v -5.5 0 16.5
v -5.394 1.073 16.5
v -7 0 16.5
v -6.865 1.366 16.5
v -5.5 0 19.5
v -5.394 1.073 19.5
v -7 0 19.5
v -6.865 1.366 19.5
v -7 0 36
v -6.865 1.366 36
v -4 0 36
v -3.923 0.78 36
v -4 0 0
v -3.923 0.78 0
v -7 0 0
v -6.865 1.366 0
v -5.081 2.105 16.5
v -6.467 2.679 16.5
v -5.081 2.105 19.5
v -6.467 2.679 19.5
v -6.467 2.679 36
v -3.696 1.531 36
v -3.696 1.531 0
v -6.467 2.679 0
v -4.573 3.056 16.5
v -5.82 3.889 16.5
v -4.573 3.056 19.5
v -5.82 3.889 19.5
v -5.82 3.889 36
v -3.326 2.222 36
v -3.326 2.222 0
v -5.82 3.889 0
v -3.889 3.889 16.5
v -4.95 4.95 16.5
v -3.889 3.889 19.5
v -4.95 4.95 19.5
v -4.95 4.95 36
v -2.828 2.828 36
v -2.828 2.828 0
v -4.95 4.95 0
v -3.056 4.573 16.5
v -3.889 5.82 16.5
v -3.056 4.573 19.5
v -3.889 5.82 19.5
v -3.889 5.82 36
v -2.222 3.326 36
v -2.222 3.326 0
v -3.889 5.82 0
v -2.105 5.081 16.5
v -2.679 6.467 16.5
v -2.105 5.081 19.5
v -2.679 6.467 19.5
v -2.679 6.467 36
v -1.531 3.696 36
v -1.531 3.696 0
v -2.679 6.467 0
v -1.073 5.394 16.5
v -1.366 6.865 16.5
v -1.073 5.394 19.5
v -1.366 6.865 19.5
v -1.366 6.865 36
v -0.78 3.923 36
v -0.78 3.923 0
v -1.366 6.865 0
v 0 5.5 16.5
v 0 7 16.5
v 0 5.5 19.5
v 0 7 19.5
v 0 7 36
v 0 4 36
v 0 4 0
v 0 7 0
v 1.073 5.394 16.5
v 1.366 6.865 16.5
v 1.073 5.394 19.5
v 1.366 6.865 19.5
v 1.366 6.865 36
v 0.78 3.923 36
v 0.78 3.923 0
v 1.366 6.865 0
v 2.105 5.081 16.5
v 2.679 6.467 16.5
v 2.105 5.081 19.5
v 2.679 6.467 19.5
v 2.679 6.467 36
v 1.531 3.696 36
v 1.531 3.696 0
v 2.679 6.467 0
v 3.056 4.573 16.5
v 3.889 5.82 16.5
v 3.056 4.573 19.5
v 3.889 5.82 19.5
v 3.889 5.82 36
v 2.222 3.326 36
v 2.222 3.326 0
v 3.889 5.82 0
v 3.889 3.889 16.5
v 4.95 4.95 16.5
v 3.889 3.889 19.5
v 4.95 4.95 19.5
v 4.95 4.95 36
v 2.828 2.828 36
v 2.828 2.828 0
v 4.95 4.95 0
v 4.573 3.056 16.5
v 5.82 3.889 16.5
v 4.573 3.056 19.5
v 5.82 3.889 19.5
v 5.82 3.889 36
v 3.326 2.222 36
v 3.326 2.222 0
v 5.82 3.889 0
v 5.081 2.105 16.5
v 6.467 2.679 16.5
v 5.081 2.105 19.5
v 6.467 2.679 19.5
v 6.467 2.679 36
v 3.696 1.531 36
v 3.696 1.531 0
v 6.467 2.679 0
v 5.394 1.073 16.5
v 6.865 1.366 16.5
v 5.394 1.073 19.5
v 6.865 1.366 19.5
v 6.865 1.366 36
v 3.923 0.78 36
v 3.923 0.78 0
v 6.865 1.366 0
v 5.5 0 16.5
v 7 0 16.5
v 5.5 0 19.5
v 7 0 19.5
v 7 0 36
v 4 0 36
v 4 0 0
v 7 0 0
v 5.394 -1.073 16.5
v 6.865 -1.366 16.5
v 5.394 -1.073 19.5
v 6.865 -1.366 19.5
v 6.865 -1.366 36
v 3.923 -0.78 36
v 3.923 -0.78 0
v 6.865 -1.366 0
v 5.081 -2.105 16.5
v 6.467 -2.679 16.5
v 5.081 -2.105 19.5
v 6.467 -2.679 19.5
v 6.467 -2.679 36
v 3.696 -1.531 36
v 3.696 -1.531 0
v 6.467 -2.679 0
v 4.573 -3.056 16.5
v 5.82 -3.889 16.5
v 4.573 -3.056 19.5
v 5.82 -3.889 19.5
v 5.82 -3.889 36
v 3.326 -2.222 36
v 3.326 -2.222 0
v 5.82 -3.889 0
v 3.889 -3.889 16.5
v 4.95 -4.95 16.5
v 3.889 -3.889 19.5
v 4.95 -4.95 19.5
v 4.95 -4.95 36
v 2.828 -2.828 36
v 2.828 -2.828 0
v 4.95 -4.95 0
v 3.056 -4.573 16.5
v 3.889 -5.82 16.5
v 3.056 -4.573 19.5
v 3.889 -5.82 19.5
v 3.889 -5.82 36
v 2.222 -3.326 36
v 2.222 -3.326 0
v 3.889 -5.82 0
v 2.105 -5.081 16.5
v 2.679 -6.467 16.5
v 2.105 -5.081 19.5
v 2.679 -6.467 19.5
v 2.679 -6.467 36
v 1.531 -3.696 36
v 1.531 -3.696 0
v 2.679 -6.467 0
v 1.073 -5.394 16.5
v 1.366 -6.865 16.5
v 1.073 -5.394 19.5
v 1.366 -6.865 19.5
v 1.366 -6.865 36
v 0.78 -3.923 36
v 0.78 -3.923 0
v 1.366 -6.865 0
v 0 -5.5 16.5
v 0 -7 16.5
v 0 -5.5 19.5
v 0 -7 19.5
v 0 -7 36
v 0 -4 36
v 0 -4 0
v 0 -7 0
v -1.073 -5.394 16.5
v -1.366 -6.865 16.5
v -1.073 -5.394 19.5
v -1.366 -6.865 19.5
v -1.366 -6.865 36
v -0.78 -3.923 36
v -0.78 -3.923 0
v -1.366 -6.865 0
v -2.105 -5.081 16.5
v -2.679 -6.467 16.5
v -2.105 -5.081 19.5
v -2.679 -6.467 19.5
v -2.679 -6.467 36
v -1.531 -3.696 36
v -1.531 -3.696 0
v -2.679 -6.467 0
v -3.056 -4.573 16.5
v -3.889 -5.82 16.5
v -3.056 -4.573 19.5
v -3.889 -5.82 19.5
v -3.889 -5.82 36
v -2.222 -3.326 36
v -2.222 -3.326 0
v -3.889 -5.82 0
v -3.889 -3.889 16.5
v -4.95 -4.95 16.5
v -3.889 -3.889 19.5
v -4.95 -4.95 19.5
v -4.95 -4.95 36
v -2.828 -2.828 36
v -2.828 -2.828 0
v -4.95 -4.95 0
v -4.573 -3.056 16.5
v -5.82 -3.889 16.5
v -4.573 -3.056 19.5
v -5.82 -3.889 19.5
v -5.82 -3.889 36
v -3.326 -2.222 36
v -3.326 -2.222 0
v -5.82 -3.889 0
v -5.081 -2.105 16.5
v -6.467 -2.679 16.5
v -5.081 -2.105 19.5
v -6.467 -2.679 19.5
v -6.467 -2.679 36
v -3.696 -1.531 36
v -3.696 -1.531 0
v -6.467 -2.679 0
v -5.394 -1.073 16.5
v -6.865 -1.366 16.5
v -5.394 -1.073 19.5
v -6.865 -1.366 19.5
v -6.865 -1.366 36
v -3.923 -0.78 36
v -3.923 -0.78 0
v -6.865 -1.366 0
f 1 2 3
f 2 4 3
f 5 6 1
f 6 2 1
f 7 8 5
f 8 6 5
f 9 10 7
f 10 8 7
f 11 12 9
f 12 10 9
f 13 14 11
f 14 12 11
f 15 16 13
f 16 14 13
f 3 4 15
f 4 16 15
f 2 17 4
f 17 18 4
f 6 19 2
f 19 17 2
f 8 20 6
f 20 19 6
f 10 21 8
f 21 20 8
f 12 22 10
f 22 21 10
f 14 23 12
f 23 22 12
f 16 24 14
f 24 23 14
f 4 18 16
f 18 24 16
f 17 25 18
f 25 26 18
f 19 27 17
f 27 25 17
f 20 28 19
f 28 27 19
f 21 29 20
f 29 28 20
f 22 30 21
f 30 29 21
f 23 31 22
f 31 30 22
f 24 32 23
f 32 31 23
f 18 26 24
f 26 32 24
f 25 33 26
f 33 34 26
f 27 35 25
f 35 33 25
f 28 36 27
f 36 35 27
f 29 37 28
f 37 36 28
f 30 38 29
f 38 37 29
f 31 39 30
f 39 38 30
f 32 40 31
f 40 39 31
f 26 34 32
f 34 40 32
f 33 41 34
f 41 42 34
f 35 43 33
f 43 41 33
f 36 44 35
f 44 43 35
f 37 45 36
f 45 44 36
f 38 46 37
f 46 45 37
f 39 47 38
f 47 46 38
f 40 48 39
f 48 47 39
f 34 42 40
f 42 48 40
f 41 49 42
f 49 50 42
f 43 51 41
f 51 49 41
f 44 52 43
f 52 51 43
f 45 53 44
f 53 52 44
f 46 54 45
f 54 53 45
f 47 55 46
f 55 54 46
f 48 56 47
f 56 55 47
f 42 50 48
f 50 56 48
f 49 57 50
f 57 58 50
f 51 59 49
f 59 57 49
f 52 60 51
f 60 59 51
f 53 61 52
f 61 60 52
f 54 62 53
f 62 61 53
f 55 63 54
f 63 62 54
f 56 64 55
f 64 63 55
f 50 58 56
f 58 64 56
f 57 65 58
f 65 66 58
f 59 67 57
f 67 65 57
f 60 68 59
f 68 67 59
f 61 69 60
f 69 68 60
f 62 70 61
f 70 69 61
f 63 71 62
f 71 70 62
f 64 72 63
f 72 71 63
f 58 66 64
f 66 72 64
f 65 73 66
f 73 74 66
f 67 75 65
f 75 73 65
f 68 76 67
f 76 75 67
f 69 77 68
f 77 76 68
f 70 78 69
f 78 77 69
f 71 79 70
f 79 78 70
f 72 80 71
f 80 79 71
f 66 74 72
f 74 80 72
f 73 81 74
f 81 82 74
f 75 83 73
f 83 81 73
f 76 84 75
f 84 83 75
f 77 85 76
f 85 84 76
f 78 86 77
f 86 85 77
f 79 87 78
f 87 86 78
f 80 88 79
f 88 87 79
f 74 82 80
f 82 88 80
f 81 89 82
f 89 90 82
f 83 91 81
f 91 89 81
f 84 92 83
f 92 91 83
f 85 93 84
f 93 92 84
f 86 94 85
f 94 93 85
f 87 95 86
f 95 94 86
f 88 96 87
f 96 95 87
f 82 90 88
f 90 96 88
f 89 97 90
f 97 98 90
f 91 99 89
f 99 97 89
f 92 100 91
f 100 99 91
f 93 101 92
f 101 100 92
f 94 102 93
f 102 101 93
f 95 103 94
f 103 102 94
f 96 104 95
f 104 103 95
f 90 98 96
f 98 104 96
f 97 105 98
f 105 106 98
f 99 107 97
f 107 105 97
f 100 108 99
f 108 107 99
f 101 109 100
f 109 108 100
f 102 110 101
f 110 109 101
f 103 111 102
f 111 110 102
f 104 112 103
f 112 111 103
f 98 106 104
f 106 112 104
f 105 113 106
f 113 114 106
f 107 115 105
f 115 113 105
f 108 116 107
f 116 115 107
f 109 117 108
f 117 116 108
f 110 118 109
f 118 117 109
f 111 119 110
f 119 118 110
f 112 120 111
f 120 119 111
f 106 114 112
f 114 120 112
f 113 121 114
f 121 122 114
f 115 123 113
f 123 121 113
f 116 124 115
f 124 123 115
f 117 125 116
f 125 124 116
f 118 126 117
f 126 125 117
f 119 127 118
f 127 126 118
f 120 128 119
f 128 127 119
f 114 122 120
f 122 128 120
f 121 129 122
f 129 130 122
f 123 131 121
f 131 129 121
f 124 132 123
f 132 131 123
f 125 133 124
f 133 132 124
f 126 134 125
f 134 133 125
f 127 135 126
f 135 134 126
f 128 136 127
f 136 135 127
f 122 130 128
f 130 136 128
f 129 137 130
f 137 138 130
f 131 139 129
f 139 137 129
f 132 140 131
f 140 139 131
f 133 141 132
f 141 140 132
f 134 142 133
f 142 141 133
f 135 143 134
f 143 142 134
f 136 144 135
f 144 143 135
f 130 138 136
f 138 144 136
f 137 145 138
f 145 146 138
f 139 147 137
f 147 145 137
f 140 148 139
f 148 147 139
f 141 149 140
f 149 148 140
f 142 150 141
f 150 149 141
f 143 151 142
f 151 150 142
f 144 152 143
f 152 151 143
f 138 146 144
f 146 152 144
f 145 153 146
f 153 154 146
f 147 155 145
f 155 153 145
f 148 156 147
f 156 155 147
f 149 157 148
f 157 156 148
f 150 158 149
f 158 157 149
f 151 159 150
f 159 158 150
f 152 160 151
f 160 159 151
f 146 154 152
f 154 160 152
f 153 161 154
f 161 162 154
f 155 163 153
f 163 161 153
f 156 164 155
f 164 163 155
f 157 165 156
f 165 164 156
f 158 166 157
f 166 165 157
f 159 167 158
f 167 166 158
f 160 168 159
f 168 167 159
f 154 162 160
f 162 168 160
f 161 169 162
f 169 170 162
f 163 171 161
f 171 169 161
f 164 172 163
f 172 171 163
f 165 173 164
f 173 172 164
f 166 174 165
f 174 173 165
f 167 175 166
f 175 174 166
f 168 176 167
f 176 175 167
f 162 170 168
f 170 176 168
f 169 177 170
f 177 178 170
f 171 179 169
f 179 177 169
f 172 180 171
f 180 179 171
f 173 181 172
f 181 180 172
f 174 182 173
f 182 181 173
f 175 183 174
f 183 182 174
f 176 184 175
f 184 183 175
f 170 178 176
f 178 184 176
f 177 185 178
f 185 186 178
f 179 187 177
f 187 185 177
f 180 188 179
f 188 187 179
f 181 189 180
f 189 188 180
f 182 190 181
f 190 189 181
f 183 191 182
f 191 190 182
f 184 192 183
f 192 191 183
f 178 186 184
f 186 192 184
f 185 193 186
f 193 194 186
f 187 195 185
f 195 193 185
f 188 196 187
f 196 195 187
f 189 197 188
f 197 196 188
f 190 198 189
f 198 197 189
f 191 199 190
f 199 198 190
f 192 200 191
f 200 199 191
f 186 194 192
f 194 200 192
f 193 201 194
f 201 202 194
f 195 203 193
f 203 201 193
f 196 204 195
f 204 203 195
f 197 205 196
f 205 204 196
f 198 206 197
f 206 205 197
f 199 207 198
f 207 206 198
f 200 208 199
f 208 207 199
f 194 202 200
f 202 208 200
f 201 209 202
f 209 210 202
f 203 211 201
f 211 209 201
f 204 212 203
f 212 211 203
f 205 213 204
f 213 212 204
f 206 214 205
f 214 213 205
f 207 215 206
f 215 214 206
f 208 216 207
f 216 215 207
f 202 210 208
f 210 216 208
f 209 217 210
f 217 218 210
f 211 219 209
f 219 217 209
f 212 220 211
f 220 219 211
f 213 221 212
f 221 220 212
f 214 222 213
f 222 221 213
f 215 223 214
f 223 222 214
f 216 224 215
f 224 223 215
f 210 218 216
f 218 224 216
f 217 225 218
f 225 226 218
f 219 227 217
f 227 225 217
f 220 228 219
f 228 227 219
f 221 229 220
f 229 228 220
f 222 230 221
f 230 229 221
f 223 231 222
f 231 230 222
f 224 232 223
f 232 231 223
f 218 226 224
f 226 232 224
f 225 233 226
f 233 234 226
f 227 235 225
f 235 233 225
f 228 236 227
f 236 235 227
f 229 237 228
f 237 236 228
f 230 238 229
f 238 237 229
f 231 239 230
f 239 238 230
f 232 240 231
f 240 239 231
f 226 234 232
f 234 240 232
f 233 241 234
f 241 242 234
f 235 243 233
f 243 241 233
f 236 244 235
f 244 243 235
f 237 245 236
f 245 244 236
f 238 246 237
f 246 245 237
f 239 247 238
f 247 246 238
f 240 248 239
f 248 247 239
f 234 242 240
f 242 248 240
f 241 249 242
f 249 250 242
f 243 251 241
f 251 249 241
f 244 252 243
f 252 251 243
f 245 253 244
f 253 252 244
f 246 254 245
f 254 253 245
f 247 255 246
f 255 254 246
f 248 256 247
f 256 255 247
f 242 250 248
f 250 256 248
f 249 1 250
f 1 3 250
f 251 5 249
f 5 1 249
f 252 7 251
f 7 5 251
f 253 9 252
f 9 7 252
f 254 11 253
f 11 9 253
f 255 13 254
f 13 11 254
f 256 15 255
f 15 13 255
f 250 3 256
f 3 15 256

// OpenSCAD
$fn = 32;

// ----------------------------------------------------------------------
// Grooved revolve: plain_grooves, bore R4
// ----------------------------------------------------------------------

// --- parameters (mm) ---
bore_r = 4;               // bore radius
outer_r = 7;              // outer radius of the body
total_h = 36;             // overall height, Z
wall = 3;                 // radial wall thickness
groove_w = 3;             // groove width
groove_d = 1.5;           // groove depth
grooves = 1;              // number of outer grooves
fit_tol = 0.05;           // declared fit tolerance (prompt contract)
free_tol = 0.2;           // declared free tolerance (prompt contract)

bbox_x = 2 * outer_r;  // full diameter
bore_d = 2 * bore_r;  // bore diameter
body_d = 2 * outer_r;  // body diameter
revolve_angle = 360;  // full turn around the Z axis

profile = [[4, 0], [7, 0], [7, 16.5], [5.5, 16.5], [5.5, 19.5], [7, 19.5], [7, 36], [4, 36]];  // primary outline, 8 points, counter clockwise

// --- the one profile operation ---
rotate_extrude(angle = revolve_angle) polygon(points = profile);
